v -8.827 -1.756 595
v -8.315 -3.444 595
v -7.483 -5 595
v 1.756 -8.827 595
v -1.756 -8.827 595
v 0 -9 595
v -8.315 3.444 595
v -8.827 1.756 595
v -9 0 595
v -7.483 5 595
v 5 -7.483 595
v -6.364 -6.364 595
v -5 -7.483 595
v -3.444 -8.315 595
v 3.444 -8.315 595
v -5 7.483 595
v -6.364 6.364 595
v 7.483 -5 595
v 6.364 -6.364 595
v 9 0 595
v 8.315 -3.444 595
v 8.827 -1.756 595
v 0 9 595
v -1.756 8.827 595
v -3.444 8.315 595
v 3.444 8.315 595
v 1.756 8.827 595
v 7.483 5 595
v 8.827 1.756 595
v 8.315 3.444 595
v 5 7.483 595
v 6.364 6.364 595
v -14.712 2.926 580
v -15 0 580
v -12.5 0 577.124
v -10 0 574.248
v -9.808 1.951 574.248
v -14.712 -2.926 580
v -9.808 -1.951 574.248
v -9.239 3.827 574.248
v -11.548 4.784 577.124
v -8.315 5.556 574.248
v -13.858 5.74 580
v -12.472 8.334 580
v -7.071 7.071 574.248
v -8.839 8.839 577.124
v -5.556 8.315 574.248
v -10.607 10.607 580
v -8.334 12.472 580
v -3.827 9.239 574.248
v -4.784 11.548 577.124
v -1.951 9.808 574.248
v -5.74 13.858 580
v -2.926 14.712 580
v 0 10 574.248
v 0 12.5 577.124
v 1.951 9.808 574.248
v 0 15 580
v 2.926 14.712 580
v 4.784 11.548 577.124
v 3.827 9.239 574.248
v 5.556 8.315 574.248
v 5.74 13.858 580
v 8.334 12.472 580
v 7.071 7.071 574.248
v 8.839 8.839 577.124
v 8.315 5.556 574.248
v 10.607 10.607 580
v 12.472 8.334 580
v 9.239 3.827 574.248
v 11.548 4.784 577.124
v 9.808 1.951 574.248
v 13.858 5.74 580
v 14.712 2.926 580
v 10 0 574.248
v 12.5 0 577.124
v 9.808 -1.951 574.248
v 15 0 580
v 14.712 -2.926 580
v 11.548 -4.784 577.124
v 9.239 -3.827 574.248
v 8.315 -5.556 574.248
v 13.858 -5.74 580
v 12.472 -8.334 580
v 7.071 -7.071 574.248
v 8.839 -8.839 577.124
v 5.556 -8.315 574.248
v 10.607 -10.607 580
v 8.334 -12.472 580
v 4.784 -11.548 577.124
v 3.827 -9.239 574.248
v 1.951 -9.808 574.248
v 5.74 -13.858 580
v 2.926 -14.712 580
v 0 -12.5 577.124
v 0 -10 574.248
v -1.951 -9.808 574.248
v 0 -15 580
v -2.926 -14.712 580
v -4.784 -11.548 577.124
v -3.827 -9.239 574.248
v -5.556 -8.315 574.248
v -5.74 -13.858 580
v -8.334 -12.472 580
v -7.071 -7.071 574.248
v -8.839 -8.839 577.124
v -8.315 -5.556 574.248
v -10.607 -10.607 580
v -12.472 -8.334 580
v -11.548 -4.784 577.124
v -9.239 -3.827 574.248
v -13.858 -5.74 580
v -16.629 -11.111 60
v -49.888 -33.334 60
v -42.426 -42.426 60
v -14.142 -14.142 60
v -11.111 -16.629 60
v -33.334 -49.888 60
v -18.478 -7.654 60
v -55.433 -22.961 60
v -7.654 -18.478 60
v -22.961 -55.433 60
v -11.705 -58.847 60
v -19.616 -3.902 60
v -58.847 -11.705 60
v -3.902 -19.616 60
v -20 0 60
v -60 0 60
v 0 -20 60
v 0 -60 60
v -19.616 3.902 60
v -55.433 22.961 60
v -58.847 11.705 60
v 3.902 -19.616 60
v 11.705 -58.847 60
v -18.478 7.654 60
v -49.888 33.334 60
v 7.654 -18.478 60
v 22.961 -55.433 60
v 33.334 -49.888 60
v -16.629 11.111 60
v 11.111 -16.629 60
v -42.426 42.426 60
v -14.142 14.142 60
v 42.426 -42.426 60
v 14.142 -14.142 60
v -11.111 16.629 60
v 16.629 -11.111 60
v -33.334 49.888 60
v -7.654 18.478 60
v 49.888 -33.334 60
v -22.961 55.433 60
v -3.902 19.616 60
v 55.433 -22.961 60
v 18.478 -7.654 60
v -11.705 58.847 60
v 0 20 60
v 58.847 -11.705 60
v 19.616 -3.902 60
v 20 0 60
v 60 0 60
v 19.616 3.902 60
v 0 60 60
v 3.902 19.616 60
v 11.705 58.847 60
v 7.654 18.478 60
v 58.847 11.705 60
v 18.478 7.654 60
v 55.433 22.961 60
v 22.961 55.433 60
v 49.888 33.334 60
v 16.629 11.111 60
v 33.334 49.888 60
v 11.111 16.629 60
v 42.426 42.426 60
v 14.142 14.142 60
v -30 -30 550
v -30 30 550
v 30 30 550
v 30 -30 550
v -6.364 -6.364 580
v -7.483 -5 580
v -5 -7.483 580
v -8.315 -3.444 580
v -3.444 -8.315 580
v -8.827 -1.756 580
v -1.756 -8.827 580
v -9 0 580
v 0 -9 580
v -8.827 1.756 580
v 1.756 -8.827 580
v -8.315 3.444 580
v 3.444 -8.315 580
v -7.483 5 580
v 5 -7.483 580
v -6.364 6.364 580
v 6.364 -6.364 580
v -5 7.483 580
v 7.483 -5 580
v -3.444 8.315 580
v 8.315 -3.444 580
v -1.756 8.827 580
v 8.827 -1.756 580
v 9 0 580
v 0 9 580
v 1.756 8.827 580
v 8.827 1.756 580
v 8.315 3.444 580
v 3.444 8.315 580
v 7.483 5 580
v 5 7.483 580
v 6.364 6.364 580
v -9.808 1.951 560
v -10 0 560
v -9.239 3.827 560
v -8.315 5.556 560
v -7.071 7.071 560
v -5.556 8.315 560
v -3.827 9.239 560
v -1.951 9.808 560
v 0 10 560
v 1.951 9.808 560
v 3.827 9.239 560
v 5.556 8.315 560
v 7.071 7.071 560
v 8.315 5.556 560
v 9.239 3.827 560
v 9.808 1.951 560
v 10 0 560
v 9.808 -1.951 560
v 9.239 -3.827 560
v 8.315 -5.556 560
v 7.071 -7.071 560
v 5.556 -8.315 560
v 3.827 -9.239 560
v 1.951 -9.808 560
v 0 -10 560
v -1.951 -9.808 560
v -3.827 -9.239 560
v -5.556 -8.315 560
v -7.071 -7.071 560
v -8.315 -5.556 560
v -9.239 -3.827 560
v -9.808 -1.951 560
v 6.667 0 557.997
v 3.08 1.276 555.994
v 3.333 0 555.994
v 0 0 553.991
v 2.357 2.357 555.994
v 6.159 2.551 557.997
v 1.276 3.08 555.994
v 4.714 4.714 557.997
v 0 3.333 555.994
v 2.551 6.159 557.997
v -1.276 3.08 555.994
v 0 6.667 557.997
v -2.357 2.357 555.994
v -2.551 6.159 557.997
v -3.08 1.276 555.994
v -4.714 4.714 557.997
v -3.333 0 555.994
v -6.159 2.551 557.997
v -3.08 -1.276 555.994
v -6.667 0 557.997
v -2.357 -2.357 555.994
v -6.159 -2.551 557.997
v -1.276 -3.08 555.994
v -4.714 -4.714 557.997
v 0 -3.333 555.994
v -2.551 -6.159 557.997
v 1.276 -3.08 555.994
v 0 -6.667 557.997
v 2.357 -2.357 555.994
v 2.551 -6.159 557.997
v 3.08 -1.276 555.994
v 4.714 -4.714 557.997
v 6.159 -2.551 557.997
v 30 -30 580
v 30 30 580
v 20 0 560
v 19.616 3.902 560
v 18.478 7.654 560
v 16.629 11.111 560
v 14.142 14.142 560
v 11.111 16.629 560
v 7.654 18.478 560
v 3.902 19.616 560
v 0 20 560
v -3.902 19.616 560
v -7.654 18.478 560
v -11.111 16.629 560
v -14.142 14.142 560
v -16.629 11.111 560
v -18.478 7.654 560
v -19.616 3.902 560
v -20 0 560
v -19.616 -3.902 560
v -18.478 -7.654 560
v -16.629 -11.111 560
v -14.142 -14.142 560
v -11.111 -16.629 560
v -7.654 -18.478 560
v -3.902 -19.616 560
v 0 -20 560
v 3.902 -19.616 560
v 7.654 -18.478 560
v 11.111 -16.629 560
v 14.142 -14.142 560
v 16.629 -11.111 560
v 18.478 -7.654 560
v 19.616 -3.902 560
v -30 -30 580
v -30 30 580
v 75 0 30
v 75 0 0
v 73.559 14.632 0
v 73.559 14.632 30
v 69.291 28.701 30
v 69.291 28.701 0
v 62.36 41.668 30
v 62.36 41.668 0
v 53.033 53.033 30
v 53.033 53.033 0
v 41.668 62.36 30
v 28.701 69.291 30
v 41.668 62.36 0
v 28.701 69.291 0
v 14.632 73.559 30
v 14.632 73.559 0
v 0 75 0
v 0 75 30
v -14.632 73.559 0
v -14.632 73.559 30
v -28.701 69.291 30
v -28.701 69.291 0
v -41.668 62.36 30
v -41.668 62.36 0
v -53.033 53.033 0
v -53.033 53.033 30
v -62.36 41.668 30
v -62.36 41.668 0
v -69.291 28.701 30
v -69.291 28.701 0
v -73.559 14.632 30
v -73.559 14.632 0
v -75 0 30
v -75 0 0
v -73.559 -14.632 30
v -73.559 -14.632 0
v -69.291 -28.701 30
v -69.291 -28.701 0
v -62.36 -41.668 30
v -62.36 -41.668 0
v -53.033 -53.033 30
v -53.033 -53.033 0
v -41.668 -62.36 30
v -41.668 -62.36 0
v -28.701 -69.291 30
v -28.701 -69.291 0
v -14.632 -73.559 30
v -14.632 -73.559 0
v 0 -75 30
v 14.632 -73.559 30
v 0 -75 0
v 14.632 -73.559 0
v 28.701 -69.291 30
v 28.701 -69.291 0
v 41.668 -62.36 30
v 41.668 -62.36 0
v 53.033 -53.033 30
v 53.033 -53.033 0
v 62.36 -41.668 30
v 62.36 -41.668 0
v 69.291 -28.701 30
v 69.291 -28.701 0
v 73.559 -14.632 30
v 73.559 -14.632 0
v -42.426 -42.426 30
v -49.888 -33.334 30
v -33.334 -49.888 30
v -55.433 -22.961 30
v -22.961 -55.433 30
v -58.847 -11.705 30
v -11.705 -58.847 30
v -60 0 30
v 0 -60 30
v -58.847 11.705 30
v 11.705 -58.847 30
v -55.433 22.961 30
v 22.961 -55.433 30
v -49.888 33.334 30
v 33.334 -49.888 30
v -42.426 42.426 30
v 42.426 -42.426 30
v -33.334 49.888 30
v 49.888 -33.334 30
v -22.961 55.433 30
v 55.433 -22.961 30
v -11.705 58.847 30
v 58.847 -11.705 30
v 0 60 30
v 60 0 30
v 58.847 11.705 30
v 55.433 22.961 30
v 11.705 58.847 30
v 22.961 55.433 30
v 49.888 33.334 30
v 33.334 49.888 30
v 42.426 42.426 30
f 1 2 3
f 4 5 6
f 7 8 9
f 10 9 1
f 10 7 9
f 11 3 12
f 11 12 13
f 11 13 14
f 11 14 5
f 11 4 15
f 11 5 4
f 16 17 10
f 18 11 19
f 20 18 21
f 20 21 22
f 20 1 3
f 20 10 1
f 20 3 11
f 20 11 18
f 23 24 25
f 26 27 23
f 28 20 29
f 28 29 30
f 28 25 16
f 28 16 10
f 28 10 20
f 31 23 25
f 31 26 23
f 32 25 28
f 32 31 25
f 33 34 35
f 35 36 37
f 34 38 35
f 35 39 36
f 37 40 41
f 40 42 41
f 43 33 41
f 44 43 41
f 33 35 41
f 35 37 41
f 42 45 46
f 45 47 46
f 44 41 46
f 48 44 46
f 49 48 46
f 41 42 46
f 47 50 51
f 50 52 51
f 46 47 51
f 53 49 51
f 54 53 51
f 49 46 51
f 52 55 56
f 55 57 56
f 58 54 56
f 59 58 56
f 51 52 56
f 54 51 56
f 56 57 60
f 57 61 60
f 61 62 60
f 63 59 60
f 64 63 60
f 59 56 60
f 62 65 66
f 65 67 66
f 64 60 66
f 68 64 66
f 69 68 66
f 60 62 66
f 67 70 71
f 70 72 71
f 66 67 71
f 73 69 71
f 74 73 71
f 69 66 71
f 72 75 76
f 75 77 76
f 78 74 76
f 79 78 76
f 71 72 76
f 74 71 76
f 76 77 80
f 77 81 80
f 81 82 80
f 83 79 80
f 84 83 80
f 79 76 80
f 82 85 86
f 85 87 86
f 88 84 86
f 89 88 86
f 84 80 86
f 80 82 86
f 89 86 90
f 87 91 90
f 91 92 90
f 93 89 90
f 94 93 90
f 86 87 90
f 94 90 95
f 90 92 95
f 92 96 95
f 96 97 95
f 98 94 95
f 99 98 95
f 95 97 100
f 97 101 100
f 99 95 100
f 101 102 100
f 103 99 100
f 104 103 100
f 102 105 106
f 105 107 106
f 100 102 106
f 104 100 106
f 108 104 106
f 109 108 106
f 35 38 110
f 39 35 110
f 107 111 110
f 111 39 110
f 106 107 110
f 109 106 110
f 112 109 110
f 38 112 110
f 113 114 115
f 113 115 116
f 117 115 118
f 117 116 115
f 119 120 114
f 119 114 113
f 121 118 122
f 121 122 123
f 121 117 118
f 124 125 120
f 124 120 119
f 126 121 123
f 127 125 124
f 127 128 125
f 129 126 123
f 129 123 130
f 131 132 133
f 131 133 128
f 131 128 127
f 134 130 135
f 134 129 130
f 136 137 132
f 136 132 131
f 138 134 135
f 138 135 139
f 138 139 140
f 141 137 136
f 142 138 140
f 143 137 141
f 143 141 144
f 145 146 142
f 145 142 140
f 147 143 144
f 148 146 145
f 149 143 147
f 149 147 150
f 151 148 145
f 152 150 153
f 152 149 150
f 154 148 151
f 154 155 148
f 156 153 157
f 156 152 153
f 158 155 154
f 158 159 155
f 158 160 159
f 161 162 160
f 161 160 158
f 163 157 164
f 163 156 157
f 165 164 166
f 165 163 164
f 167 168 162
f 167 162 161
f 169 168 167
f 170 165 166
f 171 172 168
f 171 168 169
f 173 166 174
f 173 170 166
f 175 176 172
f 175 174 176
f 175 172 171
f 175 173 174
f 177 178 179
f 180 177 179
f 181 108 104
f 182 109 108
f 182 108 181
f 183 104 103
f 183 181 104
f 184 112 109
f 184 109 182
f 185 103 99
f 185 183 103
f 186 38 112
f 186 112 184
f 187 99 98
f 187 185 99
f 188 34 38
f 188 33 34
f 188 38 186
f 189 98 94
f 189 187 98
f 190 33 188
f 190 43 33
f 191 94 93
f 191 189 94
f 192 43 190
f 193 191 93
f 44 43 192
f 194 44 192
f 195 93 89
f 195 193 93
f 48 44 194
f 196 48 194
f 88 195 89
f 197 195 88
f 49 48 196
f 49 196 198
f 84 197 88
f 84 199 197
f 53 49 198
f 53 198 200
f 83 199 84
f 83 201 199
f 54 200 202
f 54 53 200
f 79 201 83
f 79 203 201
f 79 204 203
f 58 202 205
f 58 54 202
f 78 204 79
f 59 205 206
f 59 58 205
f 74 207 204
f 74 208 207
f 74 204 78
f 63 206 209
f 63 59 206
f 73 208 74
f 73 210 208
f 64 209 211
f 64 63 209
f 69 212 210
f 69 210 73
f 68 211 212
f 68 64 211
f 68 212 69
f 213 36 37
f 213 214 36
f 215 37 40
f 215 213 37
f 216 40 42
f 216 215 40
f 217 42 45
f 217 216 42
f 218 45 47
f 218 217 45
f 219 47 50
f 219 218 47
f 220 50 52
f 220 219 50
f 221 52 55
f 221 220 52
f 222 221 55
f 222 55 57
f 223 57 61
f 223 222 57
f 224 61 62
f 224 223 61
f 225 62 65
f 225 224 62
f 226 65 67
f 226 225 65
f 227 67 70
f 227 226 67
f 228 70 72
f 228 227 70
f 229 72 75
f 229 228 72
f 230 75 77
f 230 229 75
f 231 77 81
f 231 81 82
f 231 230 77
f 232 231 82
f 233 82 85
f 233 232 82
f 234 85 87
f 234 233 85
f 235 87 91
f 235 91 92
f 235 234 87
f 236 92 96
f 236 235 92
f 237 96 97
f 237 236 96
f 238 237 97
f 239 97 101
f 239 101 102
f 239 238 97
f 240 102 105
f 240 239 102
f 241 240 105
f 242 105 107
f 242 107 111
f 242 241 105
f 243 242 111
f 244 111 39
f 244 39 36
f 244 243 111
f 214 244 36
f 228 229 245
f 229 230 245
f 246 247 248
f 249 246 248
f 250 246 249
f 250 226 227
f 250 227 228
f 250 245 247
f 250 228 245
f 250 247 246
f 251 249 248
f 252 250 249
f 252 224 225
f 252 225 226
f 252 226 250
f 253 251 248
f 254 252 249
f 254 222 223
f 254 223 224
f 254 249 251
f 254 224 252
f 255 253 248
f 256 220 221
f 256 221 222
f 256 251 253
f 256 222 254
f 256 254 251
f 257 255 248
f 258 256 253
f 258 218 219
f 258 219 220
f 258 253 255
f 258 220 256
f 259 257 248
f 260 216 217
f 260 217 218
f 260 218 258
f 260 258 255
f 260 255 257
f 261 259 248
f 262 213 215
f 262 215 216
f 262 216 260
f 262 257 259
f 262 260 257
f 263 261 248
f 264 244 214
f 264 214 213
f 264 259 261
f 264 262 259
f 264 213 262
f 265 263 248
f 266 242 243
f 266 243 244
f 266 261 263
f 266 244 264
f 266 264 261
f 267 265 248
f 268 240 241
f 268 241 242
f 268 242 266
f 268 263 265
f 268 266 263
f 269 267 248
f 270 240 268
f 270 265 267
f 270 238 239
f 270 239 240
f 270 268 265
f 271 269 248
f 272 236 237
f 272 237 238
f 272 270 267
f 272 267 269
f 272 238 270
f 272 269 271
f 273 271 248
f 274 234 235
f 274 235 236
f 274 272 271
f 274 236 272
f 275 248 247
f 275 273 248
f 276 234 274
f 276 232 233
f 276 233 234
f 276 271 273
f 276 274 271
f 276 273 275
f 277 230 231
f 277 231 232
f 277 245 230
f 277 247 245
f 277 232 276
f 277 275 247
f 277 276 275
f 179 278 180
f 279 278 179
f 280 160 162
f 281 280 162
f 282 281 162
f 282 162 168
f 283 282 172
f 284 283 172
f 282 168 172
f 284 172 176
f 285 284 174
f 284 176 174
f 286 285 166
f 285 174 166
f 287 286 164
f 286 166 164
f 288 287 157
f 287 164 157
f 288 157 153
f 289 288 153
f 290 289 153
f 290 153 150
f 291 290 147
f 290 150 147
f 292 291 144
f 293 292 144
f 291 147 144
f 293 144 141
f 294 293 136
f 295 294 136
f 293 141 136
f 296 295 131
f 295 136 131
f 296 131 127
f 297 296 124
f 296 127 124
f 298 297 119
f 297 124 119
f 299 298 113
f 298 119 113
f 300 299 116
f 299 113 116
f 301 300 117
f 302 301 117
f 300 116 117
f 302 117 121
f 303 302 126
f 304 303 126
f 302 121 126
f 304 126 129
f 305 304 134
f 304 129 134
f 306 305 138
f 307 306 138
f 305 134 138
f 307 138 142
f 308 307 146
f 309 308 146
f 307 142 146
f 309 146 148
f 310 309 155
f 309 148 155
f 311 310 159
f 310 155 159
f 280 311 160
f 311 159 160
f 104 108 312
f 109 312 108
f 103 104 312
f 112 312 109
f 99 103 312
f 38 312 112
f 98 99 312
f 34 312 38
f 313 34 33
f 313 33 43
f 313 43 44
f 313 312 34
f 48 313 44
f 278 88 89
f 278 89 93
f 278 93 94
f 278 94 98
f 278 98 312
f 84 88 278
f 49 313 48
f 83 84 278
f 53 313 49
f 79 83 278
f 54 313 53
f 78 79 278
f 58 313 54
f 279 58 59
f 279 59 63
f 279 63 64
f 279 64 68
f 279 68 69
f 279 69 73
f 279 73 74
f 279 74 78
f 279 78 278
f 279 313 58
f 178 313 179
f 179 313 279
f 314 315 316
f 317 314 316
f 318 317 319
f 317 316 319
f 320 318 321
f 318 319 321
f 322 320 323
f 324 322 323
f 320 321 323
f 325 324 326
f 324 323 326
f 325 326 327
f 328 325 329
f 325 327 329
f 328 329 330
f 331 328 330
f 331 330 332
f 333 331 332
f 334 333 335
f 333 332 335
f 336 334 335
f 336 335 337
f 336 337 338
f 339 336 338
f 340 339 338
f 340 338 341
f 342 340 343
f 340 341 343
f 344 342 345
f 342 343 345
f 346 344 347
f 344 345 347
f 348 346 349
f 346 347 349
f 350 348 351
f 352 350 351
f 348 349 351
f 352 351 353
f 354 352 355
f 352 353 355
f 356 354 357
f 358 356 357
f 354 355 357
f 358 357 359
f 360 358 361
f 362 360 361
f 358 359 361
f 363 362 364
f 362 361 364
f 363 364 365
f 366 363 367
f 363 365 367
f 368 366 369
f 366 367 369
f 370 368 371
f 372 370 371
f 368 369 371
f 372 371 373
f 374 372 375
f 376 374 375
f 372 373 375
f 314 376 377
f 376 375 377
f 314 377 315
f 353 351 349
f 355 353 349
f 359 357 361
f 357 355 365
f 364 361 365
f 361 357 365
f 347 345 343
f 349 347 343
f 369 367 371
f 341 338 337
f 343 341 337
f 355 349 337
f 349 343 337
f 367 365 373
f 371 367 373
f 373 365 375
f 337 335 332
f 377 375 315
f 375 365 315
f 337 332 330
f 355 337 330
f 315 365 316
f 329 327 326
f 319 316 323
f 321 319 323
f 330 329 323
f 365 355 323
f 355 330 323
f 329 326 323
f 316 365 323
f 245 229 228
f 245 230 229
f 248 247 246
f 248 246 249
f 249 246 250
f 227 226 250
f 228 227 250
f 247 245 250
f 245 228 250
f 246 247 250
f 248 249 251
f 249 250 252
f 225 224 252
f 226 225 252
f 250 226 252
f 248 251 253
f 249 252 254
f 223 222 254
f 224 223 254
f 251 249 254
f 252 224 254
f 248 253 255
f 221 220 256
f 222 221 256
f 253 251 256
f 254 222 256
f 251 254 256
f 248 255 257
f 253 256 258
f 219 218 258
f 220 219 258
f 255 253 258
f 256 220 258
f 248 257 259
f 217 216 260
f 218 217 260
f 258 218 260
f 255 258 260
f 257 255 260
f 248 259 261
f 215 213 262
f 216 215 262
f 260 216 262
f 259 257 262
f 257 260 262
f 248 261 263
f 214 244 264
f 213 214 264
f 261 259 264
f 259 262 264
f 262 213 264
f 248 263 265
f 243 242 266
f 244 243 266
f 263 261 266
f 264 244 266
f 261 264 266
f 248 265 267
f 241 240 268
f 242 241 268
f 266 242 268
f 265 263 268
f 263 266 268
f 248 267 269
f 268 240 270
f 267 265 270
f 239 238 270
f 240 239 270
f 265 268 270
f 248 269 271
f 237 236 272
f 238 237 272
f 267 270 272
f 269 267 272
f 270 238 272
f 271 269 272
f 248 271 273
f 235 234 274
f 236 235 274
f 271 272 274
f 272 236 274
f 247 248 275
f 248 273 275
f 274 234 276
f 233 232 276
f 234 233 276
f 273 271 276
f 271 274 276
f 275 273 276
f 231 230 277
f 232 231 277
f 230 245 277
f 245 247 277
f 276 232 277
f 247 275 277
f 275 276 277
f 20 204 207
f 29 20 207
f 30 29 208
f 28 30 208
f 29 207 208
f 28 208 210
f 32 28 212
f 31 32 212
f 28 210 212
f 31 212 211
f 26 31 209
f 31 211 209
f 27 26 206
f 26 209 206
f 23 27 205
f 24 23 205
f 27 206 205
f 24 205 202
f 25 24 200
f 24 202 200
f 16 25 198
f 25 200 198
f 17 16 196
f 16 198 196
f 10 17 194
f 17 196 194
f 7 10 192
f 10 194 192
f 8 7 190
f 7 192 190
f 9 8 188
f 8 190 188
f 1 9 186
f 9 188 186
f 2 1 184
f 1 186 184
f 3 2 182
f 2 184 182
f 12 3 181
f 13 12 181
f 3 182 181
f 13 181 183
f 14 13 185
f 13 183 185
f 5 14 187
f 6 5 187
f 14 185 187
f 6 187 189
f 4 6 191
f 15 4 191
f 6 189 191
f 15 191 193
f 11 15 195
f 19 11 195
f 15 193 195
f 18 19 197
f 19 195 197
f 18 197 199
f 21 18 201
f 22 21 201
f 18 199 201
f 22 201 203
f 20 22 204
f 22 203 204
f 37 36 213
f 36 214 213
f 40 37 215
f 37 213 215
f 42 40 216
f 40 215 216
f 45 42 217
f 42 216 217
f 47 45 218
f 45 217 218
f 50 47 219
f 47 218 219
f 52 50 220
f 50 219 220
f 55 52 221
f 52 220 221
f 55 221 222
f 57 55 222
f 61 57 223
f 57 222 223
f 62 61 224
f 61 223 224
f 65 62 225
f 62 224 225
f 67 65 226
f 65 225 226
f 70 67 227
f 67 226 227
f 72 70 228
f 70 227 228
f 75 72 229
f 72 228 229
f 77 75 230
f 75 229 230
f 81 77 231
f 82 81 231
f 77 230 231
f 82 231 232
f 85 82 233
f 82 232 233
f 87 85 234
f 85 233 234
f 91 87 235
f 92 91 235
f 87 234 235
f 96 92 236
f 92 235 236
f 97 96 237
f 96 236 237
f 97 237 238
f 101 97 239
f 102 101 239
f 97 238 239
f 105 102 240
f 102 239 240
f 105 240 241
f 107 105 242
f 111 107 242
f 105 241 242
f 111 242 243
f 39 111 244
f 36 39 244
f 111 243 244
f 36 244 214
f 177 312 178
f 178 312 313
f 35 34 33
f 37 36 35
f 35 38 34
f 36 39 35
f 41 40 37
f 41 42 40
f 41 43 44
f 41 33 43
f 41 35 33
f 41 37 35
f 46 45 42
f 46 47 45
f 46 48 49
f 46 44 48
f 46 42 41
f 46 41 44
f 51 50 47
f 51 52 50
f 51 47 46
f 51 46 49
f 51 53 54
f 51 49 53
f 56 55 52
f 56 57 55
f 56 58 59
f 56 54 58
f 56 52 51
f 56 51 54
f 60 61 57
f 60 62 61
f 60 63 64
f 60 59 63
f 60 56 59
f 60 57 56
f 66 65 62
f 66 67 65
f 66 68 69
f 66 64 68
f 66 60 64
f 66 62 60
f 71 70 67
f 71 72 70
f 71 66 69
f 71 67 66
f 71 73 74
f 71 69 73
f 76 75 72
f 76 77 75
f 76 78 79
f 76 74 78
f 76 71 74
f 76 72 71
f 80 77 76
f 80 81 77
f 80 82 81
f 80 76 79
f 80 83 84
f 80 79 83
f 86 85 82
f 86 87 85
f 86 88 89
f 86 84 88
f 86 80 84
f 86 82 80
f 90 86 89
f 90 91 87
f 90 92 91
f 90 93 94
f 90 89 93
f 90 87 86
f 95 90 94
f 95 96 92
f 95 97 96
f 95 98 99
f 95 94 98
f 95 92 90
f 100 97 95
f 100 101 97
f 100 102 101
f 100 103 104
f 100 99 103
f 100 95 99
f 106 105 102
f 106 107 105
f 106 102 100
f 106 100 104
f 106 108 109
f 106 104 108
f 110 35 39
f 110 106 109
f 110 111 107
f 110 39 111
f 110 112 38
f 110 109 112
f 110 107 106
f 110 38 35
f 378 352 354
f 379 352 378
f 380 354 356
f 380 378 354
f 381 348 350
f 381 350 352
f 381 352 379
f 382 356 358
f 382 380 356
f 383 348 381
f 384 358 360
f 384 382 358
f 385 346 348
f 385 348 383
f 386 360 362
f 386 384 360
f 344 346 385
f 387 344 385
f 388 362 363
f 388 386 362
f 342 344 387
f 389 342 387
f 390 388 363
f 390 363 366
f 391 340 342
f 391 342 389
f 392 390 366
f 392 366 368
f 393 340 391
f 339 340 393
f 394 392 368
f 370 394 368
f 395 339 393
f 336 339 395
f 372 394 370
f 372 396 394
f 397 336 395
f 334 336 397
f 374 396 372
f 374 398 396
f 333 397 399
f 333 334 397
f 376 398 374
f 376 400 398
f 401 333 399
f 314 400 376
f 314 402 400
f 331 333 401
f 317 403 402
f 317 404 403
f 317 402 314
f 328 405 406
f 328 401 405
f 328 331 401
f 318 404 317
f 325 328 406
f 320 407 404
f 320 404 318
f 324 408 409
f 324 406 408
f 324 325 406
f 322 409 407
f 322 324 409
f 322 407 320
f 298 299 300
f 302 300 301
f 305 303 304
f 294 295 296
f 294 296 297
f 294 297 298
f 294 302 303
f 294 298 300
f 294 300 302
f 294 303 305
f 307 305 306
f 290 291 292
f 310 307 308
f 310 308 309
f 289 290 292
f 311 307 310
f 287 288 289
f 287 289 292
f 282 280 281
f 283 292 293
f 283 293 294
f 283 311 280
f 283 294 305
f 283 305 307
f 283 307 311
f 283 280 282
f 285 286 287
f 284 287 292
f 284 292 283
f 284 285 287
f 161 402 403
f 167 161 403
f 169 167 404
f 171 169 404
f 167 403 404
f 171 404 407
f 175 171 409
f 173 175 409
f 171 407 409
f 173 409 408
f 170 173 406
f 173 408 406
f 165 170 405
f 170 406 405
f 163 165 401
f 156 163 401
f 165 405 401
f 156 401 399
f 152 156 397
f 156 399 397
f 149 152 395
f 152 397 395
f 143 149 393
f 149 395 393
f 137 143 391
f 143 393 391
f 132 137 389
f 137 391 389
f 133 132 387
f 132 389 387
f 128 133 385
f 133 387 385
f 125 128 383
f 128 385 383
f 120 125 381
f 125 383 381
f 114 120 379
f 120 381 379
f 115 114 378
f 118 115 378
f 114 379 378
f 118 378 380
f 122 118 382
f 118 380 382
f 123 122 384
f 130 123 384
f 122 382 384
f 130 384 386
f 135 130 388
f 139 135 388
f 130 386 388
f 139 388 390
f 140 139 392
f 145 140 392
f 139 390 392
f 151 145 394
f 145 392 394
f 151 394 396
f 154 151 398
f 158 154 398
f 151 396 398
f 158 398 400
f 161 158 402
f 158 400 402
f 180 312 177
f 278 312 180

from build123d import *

# Parameters (mm, degrees)
F0_R            = 75
F1_DEPTH        = 30
F2_R            = 60
F3_DEPTH        = 30
F4_R            = 20
F5_DEPTH        = 500
F7_W            = 60
F7_H            = 59.9999963766
F8_DEPTH        = 30
F10_D           = 20
F10_DEPTH       = 20
F10_CSINK_D     = 30
F10_CSINK_ANGLE = 82
F10_TIP         = 6.0086061903
F11_R           = 15
F12_DEPTH       = 30
F13_R           = 9
F14_DEPTH       = 15


with BuildPart() as f1:
    # F0 (on Top) → F1 (new body)
    with BuildSketch(Plane.XY):
        Circle(F0_R)
    extrude(amount=F1_DEPTH)

    # F2 (on face) → F3 (join)
    with BuildSketch(Plane.XY.offset(30)):
        Circle(F2_R)
    extrude(amount=F3_DEPTH)

    # F4 (on face) → F5 (join)
    with BuildSketch(Plane.XY.offset(60)):
        Circle(F4_R)
    extrude(amount=F5_DEPTH)


with BuildPart() as f8:
    # F7 (on offset) → F8 (new body)
    with BuildSketch(Plane.XY.offset(580)):
        Rectangle(F7_W, F7_H)
    extrude(amount=-F8_DEPTH)

    # F10
    with Locations(Plane.XY.offset(580)):
        with Locations((0, 0)):
            CounterSinkHole(F10_D / 2, F10_CSINK_D / 2, depth=F10_DEPTH, counter_sink_angle=F10_CSINK_ANGLE)
            with Locations((0, 0, -(F10_DEPTH + F10_TIP / 2))):  # 118° drill point
                Cone(0, F10_D / 2, F10_TIP, mode=Mode.SUBTRACT)


with BuildPart() as f12:
    # F11 (on face) → F12 (new body, through all)
    with BuildSketch(Plane.XY.offset(580)):
        Circle(F11_R)
    extrude(amount=-F12_DEPTH)

    # F13 (on face) → F14 (join)
    with BuildSketch(Plane.XY.offset(580)):
        Circle(F13_R)
    extrude(amount=F14_DEPTH)

    # F15: cut F8
    add(f8.part, mode=Mode.SUBTRACT)


solid = Compound([f1.part, f8.part, f12.part])
